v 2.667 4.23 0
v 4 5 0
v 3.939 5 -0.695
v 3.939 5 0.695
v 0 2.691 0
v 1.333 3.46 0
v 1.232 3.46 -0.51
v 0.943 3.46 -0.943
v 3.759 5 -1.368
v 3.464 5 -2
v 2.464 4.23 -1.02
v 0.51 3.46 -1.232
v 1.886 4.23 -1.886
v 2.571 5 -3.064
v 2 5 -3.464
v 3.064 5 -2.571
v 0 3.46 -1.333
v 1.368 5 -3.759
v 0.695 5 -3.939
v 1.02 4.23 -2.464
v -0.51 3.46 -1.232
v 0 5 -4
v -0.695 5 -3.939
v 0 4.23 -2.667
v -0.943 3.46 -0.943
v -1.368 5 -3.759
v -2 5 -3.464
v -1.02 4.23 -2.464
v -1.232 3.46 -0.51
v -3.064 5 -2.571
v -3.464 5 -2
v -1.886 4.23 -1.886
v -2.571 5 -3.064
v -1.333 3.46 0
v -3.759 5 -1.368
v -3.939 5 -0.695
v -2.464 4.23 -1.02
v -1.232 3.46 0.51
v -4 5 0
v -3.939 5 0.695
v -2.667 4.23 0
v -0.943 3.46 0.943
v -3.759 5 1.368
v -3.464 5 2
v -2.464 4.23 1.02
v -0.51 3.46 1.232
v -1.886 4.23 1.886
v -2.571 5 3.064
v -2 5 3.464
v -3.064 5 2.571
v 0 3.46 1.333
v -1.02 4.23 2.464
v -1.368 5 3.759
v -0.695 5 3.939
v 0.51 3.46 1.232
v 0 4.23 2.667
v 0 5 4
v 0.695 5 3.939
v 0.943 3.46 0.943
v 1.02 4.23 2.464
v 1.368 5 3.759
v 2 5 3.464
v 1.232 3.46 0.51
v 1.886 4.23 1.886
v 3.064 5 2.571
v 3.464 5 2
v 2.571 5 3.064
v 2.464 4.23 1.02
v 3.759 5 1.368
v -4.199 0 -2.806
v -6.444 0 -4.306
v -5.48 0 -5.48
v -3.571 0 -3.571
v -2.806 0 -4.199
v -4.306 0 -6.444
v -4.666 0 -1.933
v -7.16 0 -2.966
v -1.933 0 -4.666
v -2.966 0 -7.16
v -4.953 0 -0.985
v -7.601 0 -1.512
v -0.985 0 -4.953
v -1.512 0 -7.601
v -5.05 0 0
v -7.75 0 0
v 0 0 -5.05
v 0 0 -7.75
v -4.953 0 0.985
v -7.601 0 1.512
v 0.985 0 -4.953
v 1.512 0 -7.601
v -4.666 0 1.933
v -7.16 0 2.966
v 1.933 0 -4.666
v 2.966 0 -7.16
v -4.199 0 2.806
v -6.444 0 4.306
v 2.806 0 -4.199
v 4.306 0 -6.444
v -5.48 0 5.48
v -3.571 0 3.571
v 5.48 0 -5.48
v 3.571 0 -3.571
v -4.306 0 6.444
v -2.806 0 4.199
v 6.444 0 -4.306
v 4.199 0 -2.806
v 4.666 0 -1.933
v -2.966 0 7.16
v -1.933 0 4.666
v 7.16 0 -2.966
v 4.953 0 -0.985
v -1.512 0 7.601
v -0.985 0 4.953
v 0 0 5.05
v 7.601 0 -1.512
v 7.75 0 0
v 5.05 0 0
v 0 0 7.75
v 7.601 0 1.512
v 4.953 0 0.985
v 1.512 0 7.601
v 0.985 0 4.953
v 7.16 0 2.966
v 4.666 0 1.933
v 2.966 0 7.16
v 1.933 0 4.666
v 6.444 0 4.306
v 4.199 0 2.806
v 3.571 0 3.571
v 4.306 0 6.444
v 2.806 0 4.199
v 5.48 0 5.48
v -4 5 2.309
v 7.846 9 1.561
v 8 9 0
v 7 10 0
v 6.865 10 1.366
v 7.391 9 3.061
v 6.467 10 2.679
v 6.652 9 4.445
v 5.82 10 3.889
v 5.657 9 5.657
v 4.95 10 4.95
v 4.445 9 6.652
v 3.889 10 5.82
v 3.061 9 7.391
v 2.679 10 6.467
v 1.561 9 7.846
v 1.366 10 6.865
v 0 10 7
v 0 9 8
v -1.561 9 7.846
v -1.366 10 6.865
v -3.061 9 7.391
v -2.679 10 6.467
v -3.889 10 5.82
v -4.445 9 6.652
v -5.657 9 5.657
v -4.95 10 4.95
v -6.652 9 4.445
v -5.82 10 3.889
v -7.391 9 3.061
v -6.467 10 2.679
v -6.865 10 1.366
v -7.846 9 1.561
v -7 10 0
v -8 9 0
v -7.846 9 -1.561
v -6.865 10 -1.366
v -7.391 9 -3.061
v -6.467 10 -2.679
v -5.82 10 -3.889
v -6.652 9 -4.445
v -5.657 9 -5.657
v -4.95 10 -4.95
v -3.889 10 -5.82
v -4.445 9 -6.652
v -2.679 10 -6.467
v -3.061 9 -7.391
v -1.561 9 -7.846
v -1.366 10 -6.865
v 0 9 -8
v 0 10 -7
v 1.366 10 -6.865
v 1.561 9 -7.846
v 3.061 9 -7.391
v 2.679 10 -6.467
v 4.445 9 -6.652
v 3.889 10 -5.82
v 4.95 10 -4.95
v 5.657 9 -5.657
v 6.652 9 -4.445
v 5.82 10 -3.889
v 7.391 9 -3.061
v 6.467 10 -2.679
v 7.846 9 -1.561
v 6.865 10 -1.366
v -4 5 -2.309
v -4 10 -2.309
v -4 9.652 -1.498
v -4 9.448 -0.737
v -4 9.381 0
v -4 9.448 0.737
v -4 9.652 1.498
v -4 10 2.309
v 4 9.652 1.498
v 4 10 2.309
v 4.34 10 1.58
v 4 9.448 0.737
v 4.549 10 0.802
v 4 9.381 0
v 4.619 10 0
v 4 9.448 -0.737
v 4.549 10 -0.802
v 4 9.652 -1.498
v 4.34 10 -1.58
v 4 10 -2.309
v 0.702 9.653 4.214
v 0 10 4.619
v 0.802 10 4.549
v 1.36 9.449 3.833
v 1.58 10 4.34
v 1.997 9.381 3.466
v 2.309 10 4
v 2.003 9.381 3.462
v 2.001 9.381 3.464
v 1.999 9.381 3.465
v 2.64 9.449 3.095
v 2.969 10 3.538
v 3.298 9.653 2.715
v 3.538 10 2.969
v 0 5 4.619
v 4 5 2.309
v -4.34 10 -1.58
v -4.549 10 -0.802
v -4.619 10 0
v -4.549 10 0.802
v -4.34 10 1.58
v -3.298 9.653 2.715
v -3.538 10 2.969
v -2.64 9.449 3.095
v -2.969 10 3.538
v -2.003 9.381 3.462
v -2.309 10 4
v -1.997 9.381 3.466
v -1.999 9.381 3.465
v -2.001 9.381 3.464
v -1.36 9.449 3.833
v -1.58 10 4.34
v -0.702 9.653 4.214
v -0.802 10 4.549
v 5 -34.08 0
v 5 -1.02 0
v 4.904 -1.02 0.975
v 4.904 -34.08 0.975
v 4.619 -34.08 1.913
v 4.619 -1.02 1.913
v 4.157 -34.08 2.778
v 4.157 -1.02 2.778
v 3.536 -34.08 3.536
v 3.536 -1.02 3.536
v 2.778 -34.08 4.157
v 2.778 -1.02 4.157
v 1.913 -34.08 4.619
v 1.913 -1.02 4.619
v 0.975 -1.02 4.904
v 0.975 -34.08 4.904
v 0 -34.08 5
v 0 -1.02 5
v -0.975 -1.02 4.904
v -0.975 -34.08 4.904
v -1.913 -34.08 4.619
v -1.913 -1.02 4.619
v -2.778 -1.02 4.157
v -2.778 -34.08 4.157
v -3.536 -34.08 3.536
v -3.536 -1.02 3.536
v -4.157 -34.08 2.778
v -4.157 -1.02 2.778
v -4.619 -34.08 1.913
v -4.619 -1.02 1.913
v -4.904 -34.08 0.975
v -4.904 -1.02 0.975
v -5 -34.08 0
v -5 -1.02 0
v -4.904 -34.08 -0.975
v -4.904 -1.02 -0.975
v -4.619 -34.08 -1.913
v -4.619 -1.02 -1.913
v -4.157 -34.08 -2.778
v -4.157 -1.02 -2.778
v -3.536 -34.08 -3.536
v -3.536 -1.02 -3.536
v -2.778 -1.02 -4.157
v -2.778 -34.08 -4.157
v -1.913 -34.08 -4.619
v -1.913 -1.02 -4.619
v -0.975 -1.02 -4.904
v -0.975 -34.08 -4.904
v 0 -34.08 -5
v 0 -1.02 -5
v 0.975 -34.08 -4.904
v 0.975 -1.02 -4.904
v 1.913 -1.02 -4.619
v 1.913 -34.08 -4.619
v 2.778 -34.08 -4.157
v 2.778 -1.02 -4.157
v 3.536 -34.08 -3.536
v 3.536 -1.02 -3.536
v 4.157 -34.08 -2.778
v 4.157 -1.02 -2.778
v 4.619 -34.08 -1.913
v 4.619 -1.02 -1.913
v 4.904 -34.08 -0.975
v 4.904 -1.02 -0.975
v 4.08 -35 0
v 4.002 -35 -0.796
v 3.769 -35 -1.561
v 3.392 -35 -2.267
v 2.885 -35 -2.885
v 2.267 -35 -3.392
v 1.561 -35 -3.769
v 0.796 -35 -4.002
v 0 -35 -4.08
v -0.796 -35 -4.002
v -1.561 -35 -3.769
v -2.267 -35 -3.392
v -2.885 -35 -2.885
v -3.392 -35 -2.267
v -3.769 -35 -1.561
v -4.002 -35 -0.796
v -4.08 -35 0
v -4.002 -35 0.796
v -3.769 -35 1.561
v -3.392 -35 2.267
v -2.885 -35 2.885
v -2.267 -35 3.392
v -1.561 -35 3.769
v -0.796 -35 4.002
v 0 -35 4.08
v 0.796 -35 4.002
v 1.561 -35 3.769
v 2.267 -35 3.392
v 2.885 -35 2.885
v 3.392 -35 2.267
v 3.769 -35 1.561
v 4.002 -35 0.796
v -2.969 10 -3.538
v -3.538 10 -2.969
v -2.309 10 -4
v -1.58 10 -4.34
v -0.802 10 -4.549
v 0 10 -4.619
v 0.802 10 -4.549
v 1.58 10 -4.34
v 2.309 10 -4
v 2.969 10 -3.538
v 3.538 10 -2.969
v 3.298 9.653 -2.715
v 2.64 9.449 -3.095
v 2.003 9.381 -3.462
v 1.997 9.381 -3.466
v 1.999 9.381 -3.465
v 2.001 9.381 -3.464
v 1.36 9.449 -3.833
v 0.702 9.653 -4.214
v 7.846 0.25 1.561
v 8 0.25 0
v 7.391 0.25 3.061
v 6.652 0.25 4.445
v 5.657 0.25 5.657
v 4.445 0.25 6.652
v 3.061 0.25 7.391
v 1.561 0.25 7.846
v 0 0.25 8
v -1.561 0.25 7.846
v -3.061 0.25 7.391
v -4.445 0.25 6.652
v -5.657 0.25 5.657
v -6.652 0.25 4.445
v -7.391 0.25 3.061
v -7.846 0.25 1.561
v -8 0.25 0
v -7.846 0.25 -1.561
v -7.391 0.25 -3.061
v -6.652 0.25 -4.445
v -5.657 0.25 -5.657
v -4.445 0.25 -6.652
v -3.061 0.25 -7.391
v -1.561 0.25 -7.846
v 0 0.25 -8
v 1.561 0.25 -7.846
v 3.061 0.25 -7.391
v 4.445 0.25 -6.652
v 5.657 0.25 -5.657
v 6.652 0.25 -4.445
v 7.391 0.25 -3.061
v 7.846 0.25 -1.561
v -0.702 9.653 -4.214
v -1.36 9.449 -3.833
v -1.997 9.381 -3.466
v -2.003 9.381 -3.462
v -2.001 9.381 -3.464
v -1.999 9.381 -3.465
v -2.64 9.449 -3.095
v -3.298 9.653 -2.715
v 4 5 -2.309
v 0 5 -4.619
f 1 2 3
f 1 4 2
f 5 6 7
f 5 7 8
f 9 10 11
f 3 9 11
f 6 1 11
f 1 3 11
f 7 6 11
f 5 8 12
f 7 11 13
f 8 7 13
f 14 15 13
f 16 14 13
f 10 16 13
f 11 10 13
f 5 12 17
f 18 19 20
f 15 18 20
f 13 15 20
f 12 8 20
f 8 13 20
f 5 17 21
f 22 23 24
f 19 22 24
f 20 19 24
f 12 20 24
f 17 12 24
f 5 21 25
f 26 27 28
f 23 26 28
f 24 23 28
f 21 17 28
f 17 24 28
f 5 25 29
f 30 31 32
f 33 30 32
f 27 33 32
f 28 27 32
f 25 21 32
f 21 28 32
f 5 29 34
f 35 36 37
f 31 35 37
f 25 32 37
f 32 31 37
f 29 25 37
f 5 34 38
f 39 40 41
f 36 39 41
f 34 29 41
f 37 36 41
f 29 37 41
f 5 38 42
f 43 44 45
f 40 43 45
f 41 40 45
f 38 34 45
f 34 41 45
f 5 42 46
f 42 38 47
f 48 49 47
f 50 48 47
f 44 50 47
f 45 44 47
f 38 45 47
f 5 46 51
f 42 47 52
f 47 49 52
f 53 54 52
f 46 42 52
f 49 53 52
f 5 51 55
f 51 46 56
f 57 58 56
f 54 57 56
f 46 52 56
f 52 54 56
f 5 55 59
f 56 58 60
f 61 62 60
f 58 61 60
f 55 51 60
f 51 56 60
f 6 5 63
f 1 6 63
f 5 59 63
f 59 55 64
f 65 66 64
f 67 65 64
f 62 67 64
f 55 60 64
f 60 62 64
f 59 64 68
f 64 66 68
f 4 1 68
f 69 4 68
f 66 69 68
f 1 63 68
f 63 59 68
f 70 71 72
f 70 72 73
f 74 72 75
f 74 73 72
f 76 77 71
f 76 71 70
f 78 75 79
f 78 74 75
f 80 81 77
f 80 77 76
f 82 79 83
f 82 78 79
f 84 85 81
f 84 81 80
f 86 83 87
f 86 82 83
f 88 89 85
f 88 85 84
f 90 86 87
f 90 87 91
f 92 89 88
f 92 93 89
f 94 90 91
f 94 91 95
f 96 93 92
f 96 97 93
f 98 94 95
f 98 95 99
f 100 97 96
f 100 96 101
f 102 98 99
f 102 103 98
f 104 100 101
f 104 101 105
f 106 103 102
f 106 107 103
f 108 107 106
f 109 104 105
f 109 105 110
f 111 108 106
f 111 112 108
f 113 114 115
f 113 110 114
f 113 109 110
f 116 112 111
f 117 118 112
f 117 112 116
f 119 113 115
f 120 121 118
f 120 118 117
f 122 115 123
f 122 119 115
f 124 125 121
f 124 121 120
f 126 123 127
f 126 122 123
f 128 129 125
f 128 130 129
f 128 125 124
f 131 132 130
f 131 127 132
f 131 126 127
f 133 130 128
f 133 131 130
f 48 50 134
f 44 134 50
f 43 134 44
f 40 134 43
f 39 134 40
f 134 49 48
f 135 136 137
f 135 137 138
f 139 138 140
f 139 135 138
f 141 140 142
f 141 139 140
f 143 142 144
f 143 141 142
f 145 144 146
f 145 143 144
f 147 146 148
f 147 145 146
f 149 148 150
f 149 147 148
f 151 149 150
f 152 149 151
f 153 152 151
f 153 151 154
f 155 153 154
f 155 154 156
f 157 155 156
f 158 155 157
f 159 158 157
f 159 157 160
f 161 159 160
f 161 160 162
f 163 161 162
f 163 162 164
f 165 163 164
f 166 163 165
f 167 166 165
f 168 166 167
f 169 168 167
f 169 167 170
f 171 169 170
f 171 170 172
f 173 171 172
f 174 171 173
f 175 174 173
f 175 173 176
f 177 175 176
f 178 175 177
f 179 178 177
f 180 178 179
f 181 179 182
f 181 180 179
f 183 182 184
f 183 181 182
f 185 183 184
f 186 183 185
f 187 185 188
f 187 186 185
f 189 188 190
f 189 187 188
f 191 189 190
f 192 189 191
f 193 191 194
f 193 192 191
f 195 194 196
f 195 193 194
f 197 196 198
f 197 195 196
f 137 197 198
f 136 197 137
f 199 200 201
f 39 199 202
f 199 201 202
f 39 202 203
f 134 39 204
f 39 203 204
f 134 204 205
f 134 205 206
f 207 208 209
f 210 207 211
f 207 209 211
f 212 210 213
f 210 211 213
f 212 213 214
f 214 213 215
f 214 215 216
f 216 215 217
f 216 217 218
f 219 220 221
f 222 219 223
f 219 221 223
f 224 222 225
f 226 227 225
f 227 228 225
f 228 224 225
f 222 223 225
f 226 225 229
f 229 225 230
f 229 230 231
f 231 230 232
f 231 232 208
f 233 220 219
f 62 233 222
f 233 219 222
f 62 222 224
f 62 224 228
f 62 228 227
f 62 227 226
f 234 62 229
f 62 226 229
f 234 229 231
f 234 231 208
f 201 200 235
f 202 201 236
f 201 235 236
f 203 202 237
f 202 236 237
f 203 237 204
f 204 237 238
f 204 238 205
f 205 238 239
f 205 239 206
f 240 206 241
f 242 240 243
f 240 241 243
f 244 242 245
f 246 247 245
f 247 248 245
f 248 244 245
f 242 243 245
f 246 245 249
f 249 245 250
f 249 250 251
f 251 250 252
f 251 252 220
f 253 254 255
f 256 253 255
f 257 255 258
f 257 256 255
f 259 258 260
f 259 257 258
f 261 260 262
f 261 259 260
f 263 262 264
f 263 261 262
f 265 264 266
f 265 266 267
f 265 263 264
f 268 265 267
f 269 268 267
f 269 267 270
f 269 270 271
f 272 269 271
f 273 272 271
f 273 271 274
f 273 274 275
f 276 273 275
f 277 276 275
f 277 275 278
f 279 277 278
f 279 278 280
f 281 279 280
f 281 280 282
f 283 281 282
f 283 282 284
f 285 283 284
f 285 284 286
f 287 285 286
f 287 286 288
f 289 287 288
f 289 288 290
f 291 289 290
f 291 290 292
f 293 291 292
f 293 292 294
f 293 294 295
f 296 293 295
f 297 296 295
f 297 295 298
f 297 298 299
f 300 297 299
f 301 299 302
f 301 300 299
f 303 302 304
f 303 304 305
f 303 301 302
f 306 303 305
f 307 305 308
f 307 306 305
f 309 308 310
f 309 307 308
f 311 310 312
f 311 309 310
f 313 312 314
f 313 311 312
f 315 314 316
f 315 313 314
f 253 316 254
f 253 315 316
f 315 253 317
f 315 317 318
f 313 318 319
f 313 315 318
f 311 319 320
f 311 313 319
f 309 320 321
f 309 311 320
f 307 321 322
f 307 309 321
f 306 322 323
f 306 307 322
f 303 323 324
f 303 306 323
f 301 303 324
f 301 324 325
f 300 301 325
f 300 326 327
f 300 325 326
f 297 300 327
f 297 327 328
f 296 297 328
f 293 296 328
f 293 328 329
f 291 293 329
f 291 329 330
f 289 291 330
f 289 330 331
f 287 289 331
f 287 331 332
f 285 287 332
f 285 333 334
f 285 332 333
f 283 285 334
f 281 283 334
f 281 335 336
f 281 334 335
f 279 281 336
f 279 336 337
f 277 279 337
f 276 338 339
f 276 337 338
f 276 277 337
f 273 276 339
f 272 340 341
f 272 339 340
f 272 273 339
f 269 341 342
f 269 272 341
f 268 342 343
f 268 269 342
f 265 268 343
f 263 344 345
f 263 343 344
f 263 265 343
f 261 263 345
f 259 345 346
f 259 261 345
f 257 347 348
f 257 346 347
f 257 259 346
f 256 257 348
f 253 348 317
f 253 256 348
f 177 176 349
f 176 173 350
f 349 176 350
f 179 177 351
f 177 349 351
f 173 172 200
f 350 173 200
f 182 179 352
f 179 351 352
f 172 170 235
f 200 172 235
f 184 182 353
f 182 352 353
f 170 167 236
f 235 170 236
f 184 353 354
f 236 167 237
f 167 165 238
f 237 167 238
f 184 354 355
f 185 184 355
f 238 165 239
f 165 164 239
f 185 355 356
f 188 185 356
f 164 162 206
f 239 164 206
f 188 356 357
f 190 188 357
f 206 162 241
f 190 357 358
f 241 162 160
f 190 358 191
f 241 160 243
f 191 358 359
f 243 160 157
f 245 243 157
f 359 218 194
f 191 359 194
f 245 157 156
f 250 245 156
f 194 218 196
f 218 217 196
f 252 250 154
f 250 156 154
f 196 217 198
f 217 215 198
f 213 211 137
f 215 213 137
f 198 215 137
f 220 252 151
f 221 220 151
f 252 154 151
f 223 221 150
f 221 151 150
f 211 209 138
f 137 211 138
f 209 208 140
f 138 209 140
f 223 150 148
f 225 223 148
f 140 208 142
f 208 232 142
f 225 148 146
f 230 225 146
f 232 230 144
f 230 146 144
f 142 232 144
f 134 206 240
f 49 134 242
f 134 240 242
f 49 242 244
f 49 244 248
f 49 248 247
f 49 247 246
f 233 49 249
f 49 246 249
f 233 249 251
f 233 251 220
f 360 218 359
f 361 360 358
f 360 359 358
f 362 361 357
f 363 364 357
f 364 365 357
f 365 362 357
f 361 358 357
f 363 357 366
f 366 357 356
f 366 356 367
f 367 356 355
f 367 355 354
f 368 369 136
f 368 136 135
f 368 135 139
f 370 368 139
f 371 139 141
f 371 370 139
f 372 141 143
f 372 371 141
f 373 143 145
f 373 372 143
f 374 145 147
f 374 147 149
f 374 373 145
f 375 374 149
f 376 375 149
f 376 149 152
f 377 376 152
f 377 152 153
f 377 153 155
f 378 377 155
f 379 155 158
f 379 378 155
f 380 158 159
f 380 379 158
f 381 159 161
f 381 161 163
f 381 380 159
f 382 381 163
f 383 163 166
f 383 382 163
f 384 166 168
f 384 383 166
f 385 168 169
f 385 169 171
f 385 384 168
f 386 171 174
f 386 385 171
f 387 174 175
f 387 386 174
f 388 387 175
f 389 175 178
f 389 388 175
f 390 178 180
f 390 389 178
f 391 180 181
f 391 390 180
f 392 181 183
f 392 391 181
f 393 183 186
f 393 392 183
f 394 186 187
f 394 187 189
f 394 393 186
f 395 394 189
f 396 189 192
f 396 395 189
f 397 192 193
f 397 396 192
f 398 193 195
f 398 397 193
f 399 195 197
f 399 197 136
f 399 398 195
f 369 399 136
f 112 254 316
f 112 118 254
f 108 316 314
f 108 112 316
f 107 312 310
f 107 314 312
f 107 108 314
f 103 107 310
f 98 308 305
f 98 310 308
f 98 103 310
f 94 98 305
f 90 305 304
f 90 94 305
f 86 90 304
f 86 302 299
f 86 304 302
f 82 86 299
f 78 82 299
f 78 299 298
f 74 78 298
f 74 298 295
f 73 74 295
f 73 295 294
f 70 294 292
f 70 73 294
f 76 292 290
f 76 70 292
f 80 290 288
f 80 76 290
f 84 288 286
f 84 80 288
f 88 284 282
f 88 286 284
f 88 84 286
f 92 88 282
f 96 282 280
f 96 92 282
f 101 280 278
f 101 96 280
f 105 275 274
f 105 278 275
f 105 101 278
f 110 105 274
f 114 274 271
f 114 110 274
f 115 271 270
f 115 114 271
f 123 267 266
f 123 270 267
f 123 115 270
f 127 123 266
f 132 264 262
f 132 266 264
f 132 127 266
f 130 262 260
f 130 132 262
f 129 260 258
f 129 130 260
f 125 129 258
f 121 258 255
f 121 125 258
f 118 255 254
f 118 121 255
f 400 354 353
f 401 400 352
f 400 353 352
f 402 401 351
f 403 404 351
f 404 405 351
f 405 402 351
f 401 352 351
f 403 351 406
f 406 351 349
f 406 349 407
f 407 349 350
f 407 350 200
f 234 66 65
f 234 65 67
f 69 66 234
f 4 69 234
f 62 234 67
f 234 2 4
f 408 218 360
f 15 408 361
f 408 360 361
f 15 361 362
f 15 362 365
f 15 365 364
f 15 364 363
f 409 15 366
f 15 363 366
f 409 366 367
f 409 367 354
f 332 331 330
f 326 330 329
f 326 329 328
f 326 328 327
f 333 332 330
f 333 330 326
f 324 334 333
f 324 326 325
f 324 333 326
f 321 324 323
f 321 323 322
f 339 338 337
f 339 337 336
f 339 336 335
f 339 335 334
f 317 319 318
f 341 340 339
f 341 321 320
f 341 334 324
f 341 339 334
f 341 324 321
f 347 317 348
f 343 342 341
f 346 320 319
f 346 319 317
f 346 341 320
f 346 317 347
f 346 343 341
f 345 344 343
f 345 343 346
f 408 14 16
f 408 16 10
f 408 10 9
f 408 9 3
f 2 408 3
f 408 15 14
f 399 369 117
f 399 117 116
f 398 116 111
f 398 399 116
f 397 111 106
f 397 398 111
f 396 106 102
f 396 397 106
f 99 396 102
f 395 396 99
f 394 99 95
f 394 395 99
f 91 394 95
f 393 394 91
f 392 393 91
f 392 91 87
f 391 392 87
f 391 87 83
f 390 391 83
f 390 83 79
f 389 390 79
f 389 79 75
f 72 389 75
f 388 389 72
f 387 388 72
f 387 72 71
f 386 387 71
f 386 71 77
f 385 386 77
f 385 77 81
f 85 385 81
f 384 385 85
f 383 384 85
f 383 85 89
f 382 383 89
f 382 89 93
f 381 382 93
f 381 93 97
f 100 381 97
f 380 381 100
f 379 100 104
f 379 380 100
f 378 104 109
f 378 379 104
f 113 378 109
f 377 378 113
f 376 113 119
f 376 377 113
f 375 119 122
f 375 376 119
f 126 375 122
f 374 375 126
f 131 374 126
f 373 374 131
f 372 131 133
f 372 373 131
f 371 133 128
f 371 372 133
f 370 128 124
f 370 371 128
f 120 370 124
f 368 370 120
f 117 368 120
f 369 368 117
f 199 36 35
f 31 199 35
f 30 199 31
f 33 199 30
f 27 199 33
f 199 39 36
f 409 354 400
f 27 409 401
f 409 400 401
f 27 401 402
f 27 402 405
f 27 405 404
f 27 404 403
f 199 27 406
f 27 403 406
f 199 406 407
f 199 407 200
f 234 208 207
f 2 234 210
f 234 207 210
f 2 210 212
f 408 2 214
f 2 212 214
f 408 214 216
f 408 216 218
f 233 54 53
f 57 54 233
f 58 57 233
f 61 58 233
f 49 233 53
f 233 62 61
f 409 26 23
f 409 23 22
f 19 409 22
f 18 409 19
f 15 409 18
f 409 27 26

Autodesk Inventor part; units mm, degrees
sketch "Sketch_1" plane through (0, 0, 0) normal (0, 0, 1) x (1, 0, 0)
  line L0 (0, -35) -> (0, 10)
  line L1 (0, 2.6906) -> (4, 5)
  line L2 (4, 5) -> (4, 9.3812)
  line L3 (4, 9.3812) -> (4.6188, 10)
  line L4 (4.6188, 10) -> (7, 10)
  line L5 (7, 10) -> (8, 9)
  line L6 (8, 9) -> (8, 0.25)
  line L7 (8, 0.25) -> (7.75, 0)
  line L8 (7.75, 0) -> (5.05, 0)
  line L9 (5.05, 0) -> (5, -1.02)
  line L10 (5, -1.02) -> (5, -34.08)
  line L11 (5, -34.08) -> (4.08, -35)
  line L12 (4.08, -35) -> (0, -35)
  line L13 (0, -35) -> (0, 2.6906)
revolve "Revolution1" add sketch "Sketch_1" angle 360 about axis through (0, -35, 0) along (0, -1, 0)
thread "Thread1" size "M10x1.5" class "6g" standard "ISO Metric profile" length 29.58
sketch "Sketch_2" plane through (0, 10, 0) normal (0, 1, 0) x (1, 0, 0)
  line L0 (-4, -2.3094) -> (0, -4.6188)
  line L1 (0, -4.6188) -> (4, -2.3094)
  line L2 (4, -2.3094) -> (4, 2.3094)
  line L3 (4, 2.3094) -> (0, 4.6188)
  line L4 (0, 4.6188) -> (-4, 2.3094)
  line L5 (-4, 2.3094) -> (-4, -2.3094)
extrude "Extrusion1" cut sketch "Sketch_2" against normal blind 5
ref_plane "ANBAU_XY" through (0, 0, 0) normal (0, 1, 0) x (1, 0, 0)
ref_plane "ANBAU_YZ" through (0, 0, 0) normal (1, 0, 0) x (0, 0, -1)
ref_plane "ANBAU_ZX" through (0, 0, 0) normal (0, 0, -1) x (0, 1, 0)
ref_plane "Schraube_XY" through (0, 0, 0) normal (0, 1, 0) x (1, 0, 0)
ref_plane "Schraube_YZ" through (0, 0, 0) normal (1, 0, 0) x (0, 0, -1)
ref_plane "Schraube_ZX" through (0, 0, 0) normal (0, 0, -1) x (0, 1, 0)
ref_plane "insert_XY" through (0, 0, 0) normal (0, 1, 0) x (1, 0, 0)
ref_plane "insert_YZ" through (0, 0, 0) normal (1, 0, 0) x (0, 0, -1)
ref_plane "insert_ZX" through (0, 0, 0) normal (0, 0, -1) x (0, 1, 0)
ref_plane "schrauben_punkt_XY" through (0, -35, 0) normal (0, 1, 0) x (1, 0, 0)
ref_plane "schrauben_punkt_YZ" through (0, -35, 0) normal (1, 0, 0) x (0, 0, -1)
ref_plane "schrauben_punkt_ZX" through (0, -35, 0) normal (0, 0, -1) x (0, 1, 0)
properties part number "DIN-912 - M10x35(F)"
